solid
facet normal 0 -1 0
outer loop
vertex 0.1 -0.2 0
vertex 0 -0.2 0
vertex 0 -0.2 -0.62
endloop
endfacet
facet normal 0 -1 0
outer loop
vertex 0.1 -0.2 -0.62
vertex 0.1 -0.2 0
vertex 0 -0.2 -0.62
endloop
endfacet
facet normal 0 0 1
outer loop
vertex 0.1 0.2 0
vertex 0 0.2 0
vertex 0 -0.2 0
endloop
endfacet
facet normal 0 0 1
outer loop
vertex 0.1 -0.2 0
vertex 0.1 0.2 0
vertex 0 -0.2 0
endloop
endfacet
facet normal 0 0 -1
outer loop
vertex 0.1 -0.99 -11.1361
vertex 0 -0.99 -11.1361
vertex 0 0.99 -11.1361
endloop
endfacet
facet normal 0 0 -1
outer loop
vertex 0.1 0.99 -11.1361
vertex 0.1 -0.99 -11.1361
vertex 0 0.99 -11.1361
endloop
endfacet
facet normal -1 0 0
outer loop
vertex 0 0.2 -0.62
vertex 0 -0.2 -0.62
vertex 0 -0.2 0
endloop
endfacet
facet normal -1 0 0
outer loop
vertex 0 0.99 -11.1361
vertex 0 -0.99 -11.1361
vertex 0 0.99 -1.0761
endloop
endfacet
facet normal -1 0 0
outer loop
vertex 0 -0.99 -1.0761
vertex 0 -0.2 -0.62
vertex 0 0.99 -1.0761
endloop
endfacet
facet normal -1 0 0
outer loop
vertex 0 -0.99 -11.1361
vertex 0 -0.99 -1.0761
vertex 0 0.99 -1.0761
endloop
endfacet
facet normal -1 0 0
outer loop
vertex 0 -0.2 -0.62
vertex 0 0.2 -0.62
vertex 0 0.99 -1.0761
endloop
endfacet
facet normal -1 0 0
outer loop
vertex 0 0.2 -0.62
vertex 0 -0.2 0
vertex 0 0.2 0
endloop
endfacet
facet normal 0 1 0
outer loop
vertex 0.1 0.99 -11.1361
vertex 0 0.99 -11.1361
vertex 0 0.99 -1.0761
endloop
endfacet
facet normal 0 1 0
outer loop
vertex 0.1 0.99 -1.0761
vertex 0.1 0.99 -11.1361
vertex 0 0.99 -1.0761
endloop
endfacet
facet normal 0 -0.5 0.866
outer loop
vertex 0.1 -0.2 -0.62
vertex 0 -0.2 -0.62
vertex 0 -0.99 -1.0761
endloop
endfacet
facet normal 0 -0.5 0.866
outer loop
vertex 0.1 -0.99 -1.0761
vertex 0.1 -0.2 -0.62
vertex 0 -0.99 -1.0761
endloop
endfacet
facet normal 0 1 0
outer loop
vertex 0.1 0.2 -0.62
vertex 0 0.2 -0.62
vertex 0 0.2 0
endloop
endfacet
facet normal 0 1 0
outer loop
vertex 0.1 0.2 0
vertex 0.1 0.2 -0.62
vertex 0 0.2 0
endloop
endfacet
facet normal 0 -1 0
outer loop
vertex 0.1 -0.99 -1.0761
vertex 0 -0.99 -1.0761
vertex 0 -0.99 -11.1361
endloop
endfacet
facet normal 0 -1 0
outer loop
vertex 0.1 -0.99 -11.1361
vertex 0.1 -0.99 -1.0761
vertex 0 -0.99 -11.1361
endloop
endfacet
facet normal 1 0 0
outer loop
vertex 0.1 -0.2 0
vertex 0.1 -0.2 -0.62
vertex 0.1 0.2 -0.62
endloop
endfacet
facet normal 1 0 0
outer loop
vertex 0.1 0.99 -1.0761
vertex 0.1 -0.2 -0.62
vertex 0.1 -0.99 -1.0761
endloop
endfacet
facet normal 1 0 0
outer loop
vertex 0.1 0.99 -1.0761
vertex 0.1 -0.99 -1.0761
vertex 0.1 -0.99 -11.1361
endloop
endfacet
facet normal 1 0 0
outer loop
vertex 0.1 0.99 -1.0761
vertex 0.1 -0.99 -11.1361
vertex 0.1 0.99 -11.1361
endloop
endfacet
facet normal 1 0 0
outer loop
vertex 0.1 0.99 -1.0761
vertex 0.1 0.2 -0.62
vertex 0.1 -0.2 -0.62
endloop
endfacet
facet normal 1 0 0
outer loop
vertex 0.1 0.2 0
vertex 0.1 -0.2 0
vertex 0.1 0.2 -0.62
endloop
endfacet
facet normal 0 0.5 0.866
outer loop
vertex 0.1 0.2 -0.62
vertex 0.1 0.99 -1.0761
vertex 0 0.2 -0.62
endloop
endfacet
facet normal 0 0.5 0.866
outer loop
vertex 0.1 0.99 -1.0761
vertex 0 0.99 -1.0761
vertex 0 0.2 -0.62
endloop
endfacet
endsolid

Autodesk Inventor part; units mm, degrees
ref_plane "YZ Plane" through (0, 0, 0) normal (1, 0, 0) x (0, 1, 0)
ref_plane "XZ Plane" through (0, 0, 0) normal (0, 1, 0) x (-1, 0, 0)
ref_plane "XY Plane" through (0, 0, 0) normal (0, 0, 1) x (1, 0, 0)
sketch "Boceto2" plane through (0, 0, 0) normal (1, 0, 0) x (0, 1, 0)
  line L0 (-0.2, 0) -> (-0.2, -0.62)
  line L1 (-0.2, -0.62) -> (-0.99, -1.0761)
  line L2 (-0.99, -1.0761) -> (-0.99, -11.1361)
  line L3 (-0.99, -11.1361) -> (0, -11.1361)
  line L4 (0, 0) -> (-0.2, 0)
  line L5 (0, -11.1361) -> (0, 0)
  dimension "d10" = 0.2
  dimension "d11" = 0.62
  dimension "d12" = 10.06
  dimension "d13" = 60
  dimension "d14" = 0.99
extrude "Extrusión1" add sketch "Boceto2" along normal blind 0.1
mirror "Simetría1" about plane through (0, 0, -11.1361) normal (0, 1, 0) of "Extrusión1"
equation "\"d10\" = 0.5 * d18"
equation "\"d11\" = d15"
equation "\"d12\" = d16"
equation "\"d13\" = d17"
equation "\"d14\" = 0.5 * d19"
equation "\"Dc\" = 0.4"
equation "\"Lc\" = 0.62"
equation "\"Ln\" = 10.06"
equation "\"Do\" = 1.98"
equation "\"alfa\" = 60deg"
equation "\"d15\" = 0.62"
equation "\"d16\" = 10.06"
equation "\"d17\" = 60deg"
equation "\"d18\" = 0.4"
equation "\"d19\" = 1.98"
properties part number "2DBoquilla0.4"
